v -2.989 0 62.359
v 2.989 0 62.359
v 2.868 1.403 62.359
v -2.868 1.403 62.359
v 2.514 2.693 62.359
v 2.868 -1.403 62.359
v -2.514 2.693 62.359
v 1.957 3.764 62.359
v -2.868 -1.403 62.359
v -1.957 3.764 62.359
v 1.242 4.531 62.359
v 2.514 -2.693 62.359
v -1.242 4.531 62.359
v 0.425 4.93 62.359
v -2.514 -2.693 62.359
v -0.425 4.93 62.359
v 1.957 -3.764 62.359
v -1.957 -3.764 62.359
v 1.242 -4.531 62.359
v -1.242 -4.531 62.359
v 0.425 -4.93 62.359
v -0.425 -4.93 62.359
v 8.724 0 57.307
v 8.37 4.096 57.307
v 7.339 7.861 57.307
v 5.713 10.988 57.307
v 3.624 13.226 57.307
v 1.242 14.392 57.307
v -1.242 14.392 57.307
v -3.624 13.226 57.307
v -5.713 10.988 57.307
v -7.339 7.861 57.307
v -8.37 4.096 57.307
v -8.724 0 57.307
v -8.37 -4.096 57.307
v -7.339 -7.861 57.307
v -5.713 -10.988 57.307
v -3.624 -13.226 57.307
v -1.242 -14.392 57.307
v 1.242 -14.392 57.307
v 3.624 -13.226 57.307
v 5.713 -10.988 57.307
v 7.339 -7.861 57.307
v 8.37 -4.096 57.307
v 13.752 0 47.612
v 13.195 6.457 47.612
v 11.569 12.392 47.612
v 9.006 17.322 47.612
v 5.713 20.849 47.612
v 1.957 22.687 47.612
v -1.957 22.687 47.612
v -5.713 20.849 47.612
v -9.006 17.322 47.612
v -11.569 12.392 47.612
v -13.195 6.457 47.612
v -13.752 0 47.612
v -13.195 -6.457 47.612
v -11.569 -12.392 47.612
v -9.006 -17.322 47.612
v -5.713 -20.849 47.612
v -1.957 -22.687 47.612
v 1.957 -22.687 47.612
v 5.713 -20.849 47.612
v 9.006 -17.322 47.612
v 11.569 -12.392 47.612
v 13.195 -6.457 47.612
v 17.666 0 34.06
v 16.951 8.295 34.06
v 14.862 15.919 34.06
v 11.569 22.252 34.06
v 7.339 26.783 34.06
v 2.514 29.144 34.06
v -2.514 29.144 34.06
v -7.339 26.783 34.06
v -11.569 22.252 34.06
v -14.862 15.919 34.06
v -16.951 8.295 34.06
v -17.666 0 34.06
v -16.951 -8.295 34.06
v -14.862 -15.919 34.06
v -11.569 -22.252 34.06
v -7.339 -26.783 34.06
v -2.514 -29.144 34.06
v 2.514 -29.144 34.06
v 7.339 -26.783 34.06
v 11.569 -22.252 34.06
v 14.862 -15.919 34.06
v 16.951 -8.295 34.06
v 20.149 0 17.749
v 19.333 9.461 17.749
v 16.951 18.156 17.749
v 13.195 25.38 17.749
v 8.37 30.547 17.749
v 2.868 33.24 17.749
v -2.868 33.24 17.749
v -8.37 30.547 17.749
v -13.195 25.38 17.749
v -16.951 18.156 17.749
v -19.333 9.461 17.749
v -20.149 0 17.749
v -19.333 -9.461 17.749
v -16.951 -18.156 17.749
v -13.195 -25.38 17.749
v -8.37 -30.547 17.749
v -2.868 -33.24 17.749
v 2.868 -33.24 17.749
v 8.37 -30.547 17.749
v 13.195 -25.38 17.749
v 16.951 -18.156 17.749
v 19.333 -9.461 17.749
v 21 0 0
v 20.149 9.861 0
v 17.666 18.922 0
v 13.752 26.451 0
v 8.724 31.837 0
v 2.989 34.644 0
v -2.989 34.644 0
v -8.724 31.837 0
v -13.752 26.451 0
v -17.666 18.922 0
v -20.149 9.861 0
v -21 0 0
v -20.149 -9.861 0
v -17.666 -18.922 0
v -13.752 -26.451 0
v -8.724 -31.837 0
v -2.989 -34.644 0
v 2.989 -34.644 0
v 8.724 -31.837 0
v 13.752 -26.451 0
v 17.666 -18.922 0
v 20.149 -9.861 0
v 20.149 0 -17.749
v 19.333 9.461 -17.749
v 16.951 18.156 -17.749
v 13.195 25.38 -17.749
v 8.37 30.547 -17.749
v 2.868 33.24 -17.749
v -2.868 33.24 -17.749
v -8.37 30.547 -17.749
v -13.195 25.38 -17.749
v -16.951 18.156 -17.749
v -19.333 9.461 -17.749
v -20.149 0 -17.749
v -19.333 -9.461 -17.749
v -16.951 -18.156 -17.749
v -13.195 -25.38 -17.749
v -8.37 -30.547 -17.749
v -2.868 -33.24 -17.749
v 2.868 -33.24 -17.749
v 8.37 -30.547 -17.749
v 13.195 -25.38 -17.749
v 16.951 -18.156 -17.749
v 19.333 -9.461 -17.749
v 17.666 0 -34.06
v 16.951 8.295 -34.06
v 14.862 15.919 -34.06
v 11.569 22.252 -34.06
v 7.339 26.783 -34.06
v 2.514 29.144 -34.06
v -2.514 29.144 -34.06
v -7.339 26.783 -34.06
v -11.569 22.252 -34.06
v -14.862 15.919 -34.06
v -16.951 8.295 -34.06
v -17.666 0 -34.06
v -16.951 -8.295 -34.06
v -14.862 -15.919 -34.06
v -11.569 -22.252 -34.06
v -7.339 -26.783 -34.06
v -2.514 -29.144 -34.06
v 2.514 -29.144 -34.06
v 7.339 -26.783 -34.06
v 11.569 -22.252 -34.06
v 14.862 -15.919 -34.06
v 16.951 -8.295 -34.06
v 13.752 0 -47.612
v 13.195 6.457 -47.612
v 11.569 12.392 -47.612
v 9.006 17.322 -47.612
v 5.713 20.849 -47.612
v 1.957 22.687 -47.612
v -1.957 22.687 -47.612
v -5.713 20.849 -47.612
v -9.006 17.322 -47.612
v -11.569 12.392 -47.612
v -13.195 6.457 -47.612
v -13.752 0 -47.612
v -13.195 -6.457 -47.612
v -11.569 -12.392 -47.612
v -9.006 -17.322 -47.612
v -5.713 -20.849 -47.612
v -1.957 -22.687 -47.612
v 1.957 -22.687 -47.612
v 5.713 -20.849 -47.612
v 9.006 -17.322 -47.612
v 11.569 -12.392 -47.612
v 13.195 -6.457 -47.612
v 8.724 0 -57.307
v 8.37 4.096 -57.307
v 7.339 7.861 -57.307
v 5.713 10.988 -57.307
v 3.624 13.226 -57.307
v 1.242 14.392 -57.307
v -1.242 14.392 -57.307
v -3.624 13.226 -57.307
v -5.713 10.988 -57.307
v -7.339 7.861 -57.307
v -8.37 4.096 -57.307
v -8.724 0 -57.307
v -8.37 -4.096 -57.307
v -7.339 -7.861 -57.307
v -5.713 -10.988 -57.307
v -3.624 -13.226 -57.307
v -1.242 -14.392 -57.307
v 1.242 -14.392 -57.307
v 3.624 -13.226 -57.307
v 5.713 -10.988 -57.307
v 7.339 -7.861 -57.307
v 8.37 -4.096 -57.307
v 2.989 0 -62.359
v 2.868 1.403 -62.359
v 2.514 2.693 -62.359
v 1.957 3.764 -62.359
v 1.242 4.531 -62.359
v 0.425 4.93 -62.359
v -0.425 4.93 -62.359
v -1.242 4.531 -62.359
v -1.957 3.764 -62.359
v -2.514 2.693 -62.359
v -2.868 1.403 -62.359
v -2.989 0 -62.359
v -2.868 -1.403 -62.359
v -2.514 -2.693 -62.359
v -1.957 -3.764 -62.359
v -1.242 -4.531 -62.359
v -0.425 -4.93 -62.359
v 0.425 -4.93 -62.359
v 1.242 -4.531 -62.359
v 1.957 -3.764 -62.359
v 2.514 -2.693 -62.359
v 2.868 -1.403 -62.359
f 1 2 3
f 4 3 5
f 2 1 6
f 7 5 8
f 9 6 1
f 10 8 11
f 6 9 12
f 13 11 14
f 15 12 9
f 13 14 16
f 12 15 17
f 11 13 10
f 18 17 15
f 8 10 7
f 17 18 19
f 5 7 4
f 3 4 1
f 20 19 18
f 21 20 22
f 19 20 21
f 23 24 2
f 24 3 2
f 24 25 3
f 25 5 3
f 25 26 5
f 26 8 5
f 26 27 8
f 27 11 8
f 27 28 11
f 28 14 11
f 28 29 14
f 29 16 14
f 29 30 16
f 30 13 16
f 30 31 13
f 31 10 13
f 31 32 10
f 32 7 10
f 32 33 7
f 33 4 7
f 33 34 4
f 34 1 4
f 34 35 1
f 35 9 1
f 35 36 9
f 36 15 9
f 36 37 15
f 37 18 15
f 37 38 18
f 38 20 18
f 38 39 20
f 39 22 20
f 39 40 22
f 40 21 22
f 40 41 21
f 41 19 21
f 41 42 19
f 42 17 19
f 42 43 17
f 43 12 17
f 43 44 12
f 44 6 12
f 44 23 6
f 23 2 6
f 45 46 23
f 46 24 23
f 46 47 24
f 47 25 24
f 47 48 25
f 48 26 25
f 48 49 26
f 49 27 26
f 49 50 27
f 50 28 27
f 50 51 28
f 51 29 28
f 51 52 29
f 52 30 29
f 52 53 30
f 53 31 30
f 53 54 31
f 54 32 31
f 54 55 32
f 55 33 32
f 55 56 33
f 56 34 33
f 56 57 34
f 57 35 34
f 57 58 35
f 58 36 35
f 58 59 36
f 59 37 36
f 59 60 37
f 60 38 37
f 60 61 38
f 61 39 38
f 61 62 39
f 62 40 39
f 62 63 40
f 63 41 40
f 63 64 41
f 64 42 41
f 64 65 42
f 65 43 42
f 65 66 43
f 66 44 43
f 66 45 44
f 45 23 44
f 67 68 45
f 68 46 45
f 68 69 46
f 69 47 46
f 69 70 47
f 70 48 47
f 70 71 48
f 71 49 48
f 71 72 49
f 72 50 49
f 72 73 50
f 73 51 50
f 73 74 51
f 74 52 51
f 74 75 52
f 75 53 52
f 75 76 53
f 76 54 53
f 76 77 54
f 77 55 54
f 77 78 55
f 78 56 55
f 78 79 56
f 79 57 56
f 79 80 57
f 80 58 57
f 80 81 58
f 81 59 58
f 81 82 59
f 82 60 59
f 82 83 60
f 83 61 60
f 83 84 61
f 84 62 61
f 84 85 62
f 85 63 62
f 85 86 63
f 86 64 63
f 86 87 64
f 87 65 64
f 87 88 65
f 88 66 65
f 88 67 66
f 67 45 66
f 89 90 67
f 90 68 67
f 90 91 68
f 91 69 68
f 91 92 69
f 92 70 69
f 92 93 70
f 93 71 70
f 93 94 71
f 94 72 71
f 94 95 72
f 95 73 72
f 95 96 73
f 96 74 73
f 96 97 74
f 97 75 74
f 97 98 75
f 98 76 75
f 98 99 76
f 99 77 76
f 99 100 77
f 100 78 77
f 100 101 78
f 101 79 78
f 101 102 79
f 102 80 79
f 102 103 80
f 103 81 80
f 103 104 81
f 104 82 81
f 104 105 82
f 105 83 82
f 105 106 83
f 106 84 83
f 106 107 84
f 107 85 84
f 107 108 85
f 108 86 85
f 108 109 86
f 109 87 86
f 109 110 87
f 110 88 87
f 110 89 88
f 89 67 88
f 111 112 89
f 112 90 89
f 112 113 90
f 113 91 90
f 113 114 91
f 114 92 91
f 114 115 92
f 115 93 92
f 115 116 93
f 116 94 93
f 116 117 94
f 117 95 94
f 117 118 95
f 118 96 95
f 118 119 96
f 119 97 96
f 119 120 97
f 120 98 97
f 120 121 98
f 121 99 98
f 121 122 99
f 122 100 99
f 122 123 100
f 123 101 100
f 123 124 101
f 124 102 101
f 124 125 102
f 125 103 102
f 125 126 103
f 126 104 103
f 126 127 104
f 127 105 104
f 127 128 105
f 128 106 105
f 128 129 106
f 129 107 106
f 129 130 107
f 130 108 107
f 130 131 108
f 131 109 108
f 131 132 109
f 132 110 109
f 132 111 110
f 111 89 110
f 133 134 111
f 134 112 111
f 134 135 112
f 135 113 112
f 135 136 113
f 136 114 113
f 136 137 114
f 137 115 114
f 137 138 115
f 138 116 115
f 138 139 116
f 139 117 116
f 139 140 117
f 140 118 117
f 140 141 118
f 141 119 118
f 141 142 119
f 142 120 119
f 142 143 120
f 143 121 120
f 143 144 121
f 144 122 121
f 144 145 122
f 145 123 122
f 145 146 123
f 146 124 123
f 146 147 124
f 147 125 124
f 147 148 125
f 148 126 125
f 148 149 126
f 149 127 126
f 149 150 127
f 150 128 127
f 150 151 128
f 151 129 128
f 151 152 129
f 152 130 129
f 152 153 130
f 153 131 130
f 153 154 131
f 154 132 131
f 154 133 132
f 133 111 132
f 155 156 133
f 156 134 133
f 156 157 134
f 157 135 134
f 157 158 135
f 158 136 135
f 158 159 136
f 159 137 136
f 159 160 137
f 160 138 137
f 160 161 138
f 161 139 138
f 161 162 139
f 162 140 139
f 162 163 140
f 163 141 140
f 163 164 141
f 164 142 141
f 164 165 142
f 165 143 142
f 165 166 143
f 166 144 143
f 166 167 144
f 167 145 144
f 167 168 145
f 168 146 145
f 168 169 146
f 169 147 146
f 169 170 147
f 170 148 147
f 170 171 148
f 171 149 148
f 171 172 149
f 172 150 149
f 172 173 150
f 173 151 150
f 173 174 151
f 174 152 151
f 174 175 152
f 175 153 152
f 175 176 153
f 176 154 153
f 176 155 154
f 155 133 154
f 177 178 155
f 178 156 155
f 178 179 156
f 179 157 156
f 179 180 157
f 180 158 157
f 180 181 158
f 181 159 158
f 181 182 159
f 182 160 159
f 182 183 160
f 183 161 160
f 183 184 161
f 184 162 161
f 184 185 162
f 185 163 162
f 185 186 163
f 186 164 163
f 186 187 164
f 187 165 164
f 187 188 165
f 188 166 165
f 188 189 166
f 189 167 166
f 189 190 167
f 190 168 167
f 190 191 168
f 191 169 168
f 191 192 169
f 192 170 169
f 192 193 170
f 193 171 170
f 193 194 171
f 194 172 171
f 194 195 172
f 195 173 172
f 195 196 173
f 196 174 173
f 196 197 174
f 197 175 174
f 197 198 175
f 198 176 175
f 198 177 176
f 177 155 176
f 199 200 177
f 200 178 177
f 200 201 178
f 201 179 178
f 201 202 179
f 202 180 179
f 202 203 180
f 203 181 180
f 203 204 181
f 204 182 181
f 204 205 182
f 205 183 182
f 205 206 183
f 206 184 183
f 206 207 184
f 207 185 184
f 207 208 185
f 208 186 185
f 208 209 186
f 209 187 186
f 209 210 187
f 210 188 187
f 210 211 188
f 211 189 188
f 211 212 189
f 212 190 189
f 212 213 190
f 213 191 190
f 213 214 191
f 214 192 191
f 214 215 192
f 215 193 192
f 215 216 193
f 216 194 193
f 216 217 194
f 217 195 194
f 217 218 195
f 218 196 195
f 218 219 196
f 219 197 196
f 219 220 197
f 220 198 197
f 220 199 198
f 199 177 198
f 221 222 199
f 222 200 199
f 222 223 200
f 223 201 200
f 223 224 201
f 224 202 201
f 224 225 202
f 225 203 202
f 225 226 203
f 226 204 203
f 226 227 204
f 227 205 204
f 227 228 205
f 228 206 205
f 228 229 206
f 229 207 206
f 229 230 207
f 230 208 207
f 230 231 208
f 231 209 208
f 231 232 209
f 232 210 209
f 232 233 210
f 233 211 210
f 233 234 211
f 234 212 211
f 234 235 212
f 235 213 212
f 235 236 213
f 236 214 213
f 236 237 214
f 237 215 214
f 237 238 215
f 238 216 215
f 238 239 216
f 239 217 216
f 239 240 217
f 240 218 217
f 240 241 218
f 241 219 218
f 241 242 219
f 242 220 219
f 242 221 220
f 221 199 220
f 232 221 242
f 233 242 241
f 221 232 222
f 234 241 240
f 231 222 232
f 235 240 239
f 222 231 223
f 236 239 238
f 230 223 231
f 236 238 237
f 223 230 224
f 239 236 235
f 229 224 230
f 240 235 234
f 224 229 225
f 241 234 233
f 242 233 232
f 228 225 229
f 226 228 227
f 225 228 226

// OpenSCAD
// Generated by SolidPython 1.0.1 on 2020-07-29 00:46:45


scale(v = [3, 5, 9]) {
	sphere(r = 7);
}
/***********************************************
*********      SolidPython code:      **********
************************************************
 
# import packages: SolidPython
from solid import *
from solid.utils import *
from itertools import chain, combinations, permutations


class Resize:

    def __init__(self, scad_file):
        self.scad_file = scad_file
        #self.scad_file = import_scad(scad_file)
        # cone/cylinder param:
        self.r1 = 0
        self.r2 = 0
        self.h = 0
        # rectangular prism param:
        self.w = 0
        self.l = 0
        # ellipse param:
        self.r = 0

    # import OpenScad code (file name corresponds to shape)


    # classify shape + parameters
    def assign(self, param1, param2, param3):
        if self.scad_file == 'cone.scad':
            self.r1 = param1
            self.r2 = param2
            self.h = param3
        elif self.scad_file == 'cylinder.scad':
            self.r1 = param1
            self.r2 = param2
            self.h = param3
        elif self.scad_file == 'rectangularPrism.scad':
            self.h = param1
            self.l = param2
            self.w = param3
        else:
            self.r = param1
            self.h = param2

    # resize parameters
    def iterate(self):
        x = range(3, 20, 2)
        i = 1
        if self.scad_file == 'cone.scad':
            tempList = list(permutations(x, 2))
            for temp in tempList:
                param1 = temp[0]
                param2 = temp[1]
                filepath = 'produced_scad_files/' + 'cone' + str(param1) + '_' + str(param2) + '_' + '.scad'
                scad_render_to_file(cylinder(h=param1, r1=param2, r2=0), filepath)

        elif self.scad_file == 'cylinder.scad':
            tempList = list(permutations(x, 3))
            for temp in tempList:
                param1 = temp[0]
                param2 = temp[1]
                filepath = 'produced_scad_files/' + 'cylinder' + str(param1) + '_' + str(param2) + '_' + '.scad'
                scad_render_to_file(cylinder(h=param1, r1=param2, r2=param2), filepath)

        elif self.scad_file == 'rectangularPrism.scad':
            tempList = list(permutations(x, 3))
            for temp in tempList:
                param1 = temp[0]
                param2 = temp[1]
                param3 = temp[2]
                filepath = 'produced_scad_files/' + 'rectangularPrism' + str(param1) + '_' + str(param2) + '_' + str(
                    param3) + '.scad'
                scad_render_to_file(cube(size=(param1, param2, param3)), filepath)

        elif self.scad_file == 'ellipse.scad':
            tempList = list(permutations(x, 4))
            for temp in tempList:
                param1 = temp[0]
                param2 = temp[1]
                param3 = temp[2]
                param4 = temp[3]
                filepath = 'produced_scad_files/' + 'ellipse' + str(param1) + '_' + str(param2) + '_' + str(param3) + '_' + str(param4) + '.scad'
                scad_render_to_file(scale([param1, param2, param3])(sphere(r=param4)), filepath)

    def render_to_scadfile(self):
        scad_render_to_file(scad, 'example.scad') 
 
************************************************/
